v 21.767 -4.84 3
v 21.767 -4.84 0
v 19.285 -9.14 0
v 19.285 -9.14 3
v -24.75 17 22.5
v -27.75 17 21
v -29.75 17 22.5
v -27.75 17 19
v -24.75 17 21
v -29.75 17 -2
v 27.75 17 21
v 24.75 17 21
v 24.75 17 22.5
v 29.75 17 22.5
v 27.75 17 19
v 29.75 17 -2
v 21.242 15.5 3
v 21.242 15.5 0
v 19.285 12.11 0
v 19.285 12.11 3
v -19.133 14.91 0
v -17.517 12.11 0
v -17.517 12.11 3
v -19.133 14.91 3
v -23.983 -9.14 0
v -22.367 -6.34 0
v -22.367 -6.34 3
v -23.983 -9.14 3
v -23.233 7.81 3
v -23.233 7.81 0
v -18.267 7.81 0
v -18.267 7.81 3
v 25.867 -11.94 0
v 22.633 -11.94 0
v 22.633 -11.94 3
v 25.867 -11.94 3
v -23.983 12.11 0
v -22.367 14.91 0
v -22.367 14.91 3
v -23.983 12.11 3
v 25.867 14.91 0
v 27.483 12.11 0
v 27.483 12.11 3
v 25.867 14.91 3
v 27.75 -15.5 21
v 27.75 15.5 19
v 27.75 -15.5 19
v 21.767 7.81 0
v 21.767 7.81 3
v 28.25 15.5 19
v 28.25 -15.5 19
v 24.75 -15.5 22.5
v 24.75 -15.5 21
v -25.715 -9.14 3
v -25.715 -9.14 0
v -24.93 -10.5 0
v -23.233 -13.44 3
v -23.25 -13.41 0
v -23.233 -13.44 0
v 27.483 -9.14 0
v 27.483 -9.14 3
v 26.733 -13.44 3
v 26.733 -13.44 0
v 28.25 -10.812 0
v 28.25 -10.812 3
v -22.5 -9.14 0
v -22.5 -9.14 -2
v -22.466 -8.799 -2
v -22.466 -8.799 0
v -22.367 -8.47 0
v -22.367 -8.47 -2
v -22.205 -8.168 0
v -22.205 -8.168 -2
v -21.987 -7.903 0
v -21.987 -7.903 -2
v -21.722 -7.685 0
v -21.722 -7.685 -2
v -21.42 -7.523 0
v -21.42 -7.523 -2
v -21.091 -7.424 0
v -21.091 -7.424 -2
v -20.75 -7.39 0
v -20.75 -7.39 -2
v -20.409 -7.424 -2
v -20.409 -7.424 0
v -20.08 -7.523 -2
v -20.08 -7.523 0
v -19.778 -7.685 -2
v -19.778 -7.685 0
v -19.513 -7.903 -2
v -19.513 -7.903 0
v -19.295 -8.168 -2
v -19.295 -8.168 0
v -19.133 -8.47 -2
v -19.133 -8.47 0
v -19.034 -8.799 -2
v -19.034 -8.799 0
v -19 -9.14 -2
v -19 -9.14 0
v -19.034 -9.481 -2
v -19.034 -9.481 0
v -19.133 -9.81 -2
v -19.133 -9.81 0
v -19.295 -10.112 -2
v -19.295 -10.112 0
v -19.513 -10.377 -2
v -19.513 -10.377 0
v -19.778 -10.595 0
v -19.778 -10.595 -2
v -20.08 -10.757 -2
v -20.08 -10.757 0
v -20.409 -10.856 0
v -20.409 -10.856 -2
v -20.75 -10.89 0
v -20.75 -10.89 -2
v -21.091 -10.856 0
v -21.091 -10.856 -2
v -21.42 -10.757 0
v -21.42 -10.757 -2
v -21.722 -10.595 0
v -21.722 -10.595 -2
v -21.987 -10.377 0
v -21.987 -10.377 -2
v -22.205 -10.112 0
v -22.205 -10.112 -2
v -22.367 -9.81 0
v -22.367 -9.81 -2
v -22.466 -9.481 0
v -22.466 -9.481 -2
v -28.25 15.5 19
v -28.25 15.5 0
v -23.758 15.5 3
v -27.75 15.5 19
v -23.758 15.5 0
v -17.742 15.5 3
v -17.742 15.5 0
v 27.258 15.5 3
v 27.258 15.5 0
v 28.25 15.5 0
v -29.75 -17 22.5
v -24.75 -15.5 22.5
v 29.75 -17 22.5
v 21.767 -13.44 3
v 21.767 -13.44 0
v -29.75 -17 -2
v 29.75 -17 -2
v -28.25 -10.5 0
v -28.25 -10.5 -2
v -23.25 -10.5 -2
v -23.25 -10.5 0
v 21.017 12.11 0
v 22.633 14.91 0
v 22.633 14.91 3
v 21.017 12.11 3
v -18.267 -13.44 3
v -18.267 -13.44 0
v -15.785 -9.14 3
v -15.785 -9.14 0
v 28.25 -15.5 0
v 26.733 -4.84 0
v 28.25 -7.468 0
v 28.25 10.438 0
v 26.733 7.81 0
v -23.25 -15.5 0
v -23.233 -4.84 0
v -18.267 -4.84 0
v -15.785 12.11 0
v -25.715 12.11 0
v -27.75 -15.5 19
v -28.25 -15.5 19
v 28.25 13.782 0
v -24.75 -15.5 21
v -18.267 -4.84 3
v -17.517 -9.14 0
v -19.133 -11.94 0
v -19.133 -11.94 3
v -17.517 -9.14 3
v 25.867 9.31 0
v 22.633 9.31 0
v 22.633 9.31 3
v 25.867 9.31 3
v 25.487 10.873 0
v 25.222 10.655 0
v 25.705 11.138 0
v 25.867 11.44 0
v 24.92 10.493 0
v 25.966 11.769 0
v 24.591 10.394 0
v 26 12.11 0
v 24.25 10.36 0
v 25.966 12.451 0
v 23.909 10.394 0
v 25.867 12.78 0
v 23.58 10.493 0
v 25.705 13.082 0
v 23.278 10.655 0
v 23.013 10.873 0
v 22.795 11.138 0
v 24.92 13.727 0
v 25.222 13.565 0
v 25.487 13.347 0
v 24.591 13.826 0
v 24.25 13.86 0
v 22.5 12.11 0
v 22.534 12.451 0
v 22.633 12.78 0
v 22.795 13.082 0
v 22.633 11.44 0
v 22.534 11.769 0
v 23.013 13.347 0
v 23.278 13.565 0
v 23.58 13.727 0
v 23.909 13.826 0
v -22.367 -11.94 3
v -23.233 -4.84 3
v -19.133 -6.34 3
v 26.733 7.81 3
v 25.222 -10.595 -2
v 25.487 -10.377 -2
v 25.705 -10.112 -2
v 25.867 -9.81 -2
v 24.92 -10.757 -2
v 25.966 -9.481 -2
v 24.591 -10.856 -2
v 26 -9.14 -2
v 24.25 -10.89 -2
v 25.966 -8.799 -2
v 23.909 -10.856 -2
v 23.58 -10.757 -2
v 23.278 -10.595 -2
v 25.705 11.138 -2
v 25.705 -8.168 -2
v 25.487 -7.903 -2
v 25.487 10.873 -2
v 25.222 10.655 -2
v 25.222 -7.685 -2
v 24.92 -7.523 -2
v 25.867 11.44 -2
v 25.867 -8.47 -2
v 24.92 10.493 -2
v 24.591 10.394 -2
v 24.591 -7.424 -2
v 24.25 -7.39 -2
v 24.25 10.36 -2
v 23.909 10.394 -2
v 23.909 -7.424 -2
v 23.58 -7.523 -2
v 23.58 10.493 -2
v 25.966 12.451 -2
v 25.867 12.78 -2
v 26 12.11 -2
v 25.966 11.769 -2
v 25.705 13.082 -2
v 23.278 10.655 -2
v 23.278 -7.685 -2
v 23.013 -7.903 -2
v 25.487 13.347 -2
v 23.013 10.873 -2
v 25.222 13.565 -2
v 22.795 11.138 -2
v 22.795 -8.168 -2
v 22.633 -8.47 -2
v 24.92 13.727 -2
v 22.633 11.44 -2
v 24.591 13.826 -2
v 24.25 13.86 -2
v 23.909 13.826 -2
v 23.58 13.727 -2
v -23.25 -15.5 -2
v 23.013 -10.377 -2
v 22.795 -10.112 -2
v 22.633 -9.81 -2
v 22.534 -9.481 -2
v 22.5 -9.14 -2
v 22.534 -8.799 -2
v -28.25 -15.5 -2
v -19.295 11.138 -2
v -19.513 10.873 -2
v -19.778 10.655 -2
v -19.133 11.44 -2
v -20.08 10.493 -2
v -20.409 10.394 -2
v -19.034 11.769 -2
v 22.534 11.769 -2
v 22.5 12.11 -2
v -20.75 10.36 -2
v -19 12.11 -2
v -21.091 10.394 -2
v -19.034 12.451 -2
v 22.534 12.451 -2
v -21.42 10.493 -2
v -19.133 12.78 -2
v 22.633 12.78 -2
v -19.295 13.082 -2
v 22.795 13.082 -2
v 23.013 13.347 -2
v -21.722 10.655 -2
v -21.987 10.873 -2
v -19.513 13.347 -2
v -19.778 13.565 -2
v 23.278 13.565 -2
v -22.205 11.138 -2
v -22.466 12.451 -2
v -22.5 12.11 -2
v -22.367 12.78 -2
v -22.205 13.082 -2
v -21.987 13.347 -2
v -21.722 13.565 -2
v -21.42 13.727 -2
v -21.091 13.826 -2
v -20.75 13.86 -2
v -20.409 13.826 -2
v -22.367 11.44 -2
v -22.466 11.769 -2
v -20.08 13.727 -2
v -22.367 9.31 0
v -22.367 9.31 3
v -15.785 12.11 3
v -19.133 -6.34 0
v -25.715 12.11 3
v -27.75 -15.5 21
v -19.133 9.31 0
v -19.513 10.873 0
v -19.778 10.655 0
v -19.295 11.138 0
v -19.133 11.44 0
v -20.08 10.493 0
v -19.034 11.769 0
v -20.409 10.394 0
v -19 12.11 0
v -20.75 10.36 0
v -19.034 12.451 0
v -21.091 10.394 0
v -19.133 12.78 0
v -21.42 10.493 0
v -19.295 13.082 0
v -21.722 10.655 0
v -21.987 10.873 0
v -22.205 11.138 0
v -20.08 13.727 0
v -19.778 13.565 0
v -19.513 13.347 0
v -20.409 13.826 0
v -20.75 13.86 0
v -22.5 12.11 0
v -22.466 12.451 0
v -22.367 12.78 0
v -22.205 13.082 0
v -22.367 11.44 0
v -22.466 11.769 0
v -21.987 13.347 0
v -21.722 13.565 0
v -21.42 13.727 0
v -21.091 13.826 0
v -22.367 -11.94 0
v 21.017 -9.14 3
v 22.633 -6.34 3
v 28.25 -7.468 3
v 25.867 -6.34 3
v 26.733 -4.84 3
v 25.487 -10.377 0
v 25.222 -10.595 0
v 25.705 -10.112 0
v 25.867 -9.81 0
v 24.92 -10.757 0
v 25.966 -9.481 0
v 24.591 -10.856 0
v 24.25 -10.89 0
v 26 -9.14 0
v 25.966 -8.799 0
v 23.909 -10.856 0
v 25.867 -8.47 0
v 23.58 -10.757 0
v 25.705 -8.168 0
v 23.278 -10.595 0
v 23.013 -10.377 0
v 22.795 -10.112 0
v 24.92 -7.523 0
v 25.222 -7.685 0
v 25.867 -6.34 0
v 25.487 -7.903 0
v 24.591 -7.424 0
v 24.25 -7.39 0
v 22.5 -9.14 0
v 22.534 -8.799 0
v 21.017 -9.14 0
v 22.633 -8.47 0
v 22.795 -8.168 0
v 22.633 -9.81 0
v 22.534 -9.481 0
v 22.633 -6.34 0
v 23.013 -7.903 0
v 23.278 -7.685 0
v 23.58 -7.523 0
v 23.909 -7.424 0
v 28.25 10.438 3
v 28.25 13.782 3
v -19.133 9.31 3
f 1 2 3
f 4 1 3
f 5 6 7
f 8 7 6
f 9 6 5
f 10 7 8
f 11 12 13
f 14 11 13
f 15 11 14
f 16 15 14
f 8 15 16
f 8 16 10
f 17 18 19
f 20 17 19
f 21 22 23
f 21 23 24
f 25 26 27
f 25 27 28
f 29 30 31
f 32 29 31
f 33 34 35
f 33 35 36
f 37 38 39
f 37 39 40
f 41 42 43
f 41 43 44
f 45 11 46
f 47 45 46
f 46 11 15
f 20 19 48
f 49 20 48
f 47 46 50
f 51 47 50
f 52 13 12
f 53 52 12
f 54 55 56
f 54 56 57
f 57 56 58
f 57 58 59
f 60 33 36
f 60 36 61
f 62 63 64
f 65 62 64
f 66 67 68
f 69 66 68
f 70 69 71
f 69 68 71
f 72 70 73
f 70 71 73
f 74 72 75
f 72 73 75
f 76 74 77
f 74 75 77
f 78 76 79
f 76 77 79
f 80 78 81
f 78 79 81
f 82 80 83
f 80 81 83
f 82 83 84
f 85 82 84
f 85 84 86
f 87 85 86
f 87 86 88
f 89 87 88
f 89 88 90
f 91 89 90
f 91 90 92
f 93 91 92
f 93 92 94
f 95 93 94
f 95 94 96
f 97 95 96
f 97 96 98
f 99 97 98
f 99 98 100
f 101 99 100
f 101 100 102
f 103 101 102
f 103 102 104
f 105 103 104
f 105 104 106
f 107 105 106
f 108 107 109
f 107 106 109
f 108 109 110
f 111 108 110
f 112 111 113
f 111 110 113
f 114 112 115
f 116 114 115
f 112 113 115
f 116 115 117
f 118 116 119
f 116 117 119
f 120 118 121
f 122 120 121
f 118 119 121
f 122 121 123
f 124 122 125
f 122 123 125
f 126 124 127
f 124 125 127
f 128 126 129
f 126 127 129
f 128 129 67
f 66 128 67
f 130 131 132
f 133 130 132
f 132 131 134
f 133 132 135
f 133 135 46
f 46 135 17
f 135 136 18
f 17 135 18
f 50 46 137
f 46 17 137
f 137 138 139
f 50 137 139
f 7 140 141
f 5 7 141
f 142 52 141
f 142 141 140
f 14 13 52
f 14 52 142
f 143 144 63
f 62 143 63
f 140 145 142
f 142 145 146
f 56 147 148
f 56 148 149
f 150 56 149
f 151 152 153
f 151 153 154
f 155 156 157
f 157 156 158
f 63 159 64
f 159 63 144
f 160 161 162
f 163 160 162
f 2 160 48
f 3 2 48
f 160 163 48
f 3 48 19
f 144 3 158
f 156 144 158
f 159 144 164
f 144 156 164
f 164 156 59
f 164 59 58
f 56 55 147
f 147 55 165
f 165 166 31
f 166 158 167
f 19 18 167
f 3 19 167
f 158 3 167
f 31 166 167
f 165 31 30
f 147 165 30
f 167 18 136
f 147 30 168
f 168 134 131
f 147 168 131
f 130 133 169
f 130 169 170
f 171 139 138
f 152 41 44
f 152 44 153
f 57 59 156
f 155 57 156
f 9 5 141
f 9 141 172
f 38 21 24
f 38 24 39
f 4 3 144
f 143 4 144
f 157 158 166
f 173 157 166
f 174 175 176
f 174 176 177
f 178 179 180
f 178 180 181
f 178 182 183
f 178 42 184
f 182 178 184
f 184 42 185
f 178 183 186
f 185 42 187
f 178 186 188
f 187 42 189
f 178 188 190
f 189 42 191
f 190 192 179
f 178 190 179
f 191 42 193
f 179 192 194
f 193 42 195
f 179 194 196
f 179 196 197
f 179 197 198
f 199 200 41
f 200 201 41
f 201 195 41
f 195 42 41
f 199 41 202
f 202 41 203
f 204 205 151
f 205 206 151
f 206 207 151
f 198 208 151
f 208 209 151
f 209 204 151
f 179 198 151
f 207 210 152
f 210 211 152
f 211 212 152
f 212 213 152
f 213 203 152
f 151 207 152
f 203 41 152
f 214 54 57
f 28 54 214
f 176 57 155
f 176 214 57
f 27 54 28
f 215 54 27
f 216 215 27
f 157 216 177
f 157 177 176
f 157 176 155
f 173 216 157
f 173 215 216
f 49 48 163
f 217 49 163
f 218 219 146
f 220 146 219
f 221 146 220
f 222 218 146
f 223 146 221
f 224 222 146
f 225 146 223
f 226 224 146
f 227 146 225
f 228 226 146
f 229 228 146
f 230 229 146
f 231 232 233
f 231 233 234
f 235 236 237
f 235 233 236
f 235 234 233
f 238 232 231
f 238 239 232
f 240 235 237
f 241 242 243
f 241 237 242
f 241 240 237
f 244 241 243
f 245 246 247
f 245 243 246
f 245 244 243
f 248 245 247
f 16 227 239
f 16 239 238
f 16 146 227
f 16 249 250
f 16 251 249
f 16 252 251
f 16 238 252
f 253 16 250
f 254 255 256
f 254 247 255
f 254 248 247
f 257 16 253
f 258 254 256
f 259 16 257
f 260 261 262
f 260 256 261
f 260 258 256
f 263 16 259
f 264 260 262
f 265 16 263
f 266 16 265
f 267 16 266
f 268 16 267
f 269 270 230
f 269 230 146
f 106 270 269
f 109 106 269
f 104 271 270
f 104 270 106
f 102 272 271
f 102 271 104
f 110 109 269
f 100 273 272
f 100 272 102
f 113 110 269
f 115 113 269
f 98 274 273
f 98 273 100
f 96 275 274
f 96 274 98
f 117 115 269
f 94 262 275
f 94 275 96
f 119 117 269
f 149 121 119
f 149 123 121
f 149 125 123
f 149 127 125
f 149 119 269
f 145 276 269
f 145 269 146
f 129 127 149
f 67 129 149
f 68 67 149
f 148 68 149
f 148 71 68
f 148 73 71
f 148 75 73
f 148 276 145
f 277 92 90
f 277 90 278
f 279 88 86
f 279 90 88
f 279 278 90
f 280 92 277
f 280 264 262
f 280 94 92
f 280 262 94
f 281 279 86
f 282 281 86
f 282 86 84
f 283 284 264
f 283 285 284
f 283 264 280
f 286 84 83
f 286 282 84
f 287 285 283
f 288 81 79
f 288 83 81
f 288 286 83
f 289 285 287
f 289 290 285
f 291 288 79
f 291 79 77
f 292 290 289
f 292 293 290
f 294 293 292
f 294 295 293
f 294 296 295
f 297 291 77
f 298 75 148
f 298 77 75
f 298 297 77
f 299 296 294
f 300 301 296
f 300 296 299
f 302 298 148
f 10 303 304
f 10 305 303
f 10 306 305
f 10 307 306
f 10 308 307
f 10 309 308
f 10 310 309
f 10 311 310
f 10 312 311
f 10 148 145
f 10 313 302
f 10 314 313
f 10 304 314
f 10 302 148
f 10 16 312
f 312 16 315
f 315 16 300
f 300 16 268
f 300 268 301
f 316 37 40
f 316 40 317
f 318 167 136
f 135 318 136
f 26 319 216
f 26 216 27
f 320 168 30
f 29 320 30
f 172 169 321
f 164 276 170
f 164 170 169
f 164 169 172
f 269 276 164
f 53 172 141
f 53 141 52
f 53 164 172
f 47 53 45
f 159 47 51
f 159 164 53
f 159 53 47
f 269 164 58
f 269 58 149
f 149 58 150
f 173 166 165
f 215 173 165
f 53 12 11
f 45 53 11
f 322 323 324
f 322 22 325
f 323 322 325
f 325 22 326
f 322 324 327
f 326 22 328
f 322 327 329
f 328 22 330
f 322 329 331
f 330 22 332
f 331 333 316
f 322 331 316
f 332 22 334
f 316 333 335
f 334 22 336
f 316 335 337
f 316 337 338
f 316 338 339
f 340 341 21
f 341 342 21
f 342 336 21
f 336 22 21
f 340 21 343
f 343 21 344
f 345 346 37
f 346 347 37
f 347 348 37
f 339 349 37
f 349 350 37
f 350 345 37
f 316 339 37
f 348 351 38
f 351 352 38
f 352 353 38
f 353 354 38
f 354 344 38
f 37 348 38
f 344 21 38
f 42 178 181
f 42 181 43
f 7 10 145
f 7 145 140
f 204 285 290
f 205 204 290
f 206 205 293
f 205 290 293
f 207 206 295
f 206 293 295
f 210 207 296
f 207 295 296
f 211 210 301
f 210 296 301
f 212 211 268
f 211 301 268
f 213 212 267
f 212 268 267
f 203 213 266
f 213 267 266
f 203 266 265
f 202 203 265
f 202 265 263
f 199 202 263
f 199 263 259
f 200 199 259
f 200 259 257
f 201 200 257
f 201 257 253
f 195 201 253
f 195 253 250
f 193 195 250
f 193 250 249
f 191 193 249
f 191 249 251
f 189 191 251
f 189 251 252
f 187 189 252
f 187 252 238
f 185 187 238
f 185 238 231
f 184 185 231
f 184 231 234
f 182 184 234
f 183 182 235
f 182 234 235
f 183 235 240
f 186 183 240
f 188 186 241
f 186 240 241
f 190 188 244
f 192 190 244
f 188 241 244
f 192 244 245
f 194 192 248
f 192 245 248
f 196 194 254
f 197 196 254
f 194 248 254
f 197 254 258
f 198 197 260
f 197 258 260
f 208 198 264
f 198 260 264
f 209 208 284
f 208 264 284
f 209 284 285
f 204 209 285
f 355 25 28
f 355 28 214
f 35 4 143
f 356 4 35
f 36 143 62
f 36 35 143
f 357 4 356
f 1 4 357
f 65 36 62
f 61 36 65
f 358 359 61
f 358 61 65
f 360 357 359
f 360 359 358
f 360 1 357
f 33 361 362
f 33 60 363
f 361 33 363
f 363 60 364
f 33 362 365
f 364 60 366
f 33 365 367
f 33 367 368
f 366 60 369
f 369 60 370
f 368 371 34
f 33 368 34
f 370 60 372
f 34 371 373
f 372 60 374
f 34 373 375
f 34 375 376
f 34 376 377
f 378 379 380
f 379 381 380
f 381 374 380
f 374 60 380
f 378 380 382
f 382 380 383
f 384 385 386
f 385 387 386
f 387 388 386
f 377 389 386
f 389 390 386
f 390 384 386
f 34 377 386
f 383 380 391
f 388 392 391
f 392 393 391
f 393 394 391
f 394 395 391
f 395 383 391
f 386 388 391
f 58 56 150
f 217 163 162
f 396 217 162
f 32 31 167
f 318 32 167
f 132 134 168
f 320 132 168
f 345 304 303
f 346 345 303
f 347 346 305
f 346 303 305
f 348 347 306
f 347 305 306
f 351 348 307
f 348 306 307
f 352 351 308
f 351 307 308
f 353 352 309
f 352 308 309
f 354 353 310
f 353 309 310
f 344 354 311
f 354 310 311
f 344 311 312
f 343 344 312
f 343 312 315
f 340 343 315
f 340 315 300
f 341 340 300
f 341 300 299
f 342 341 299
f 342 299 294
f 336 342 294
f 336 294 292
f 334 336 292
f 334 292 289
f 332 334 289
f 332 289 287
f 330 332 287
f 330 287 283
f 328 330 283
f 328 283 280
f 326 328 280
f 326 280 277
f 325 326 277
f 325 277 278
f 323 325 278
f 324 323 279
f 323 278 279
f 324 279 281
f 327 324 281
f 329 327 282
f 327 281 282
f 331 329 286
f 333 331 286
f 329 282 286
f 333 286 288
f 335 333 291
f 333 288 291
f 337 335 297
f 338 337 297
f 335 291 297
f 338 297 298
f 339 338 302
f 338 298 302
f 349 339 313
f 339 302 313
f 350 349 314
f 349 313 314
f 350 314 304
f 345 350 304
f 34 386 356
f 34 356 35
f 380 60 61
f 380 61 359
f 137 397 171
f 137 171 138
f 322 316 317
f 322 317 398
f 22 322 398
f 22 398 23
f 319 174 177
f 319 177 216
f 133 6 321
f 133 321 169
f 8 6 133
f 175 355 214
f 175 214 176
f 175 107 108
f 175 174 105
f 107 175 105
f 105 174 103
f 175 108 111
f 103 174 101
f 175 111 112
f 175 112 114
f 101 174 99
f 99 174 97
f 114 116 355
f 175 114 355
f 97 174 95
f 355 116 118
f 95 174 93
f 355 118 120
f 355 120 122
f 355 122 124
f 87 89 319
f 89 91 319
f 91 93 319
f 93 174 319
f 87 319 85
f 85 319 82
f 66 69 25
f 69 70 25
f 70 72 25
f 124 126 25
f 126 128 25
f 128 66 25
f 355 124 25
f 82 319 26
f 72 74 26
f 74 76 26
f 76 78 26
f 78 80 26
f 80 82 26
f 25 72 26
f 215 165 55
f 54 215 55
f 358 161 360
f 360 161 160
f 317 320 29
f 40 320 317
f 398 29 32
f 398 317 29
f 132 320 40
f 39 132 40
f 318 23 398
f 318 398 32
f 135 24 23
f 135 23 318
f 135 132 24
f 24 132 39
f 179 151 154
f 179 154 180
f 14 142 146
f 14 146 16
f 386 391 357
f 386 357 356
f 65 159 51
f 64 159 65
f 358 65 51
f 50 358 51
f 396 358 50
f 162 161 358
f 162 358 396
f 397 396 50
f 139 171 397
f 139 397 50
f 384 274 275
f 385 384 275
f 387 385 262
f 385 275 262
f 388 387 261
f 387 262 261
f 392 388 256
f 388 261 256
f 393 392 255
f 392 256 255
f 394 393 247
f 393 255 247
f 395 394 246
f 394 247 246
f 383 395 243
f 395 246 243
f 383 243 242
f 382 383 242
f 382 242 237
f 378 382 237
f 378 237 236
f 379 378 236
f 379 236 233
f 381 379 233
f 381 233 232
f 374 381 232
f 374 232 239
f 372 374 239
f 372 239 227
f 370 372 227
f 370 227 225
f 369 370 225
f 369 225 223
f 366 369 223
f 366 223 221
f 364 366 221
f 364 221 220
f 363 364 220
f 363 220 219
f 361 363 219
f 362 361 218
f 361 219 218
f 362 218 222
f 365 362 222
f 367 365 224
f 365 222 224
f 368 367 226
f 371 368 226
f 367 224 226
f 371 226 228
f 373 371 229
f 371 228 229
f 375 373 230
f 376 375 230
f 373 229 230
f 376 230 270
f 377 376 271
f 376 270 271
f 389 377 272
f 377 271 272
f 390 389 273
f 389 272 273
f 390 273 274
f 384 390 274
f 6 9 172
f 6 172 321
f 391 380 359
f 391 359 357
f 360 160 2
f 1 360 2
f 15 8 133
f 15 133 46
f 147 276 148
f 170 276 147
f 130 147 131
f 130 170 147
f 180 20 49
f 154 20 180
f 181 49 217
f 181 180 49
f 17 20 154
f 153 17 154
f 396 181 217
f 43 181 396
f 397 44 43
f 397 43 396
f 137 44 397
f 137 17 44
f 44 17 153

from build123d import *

# Parameters (mm, degrees)
CROQUIS1_W              = 59.5
CROQUIS1_H              = 34
CROQUIS1_W_2            = 56.5
CROQUIS1_H_2            = 31
EXTRUIR_L_MINA1_DEPTH   = 19
CROQUIS2_W              = 59.5
CROQUIS2_H              = 34
SALIENTE_EXTRUIR1_DEPTH = 2
SALIENTE_EXTRUIR3_DEPTH = 34
CROQUIS5_W              = 59.5
CROQUIS5_H              = 1.5
SALIENTE_EXTRUIR4_DEPTH = 3.5
CROQUIS6_W              = 5
CROQUIS6_H              = 5
CORTAR_EXTRUIR1_DEPTH   = 3.5
CROQUIS7_R              = 1.75
CORTAR_EXTRUIR2_DEPTH   = 3.5
EXTRUIR_L_MINA2_DEPTH   = 3


with BuildPart() as part:
    # Croquis1 → Extruir-Lámina1 (new body)
    with BuildSketch(Plane.XY):
        Rectangle(CROQUIS1_W, CROQUIS1_H)
        Rectangle(CROQUIS1_W_2, CROQUIS1_H_2, mode=Mode.SUBTRACT)
    extrude(amount=EXTRUIR_L_MINA1_DEPTH)

    # Croquis2 → Saliente-Extruir1 (add)
    with BuildSketch(Plane(origin=(0, 0, 0), x_dir=(-1, 0, 0), z_dir=(0, 0, -1))):
        Rectangle(CROQUIS2_W, CROQUIS2_H)
    extrude(amount=SALIENTE_EXTRUIR1_DEPTH)

    # Croquis4 → Saliente-Extruir3 (add)
    with BuildSketch(Plane(origin=(0, 17, 0), x_dir=(1, 0, 0), z_dir=(0, 1, 0))):
        Polygon((-29.75, -19), (-29.75, -22.5), (-24.75, -22.5), (-24.75, -21), (-27.75, -21), (-27.75, -19), align=None)
        Polygon((27.75, -21), (27.75, -19), (29.75, -19), (29.75, -22.5), (24.75, -22.5), (24.75, -21), align=None)
    extrude(amount=-SALIENTE_EXTRUIR3_DEPTH)

    # Croquis5 → Saliente-Extruir4 (add)
    with BuildSketch(Plane.XY.offset(19)):
        with Locations((0, -16.25)):
            Rectangle(CROQUIS5_W, CROQUIS5_H)
    extrude(amount=SALIENTE_EXTRUIR4_DEPTH)

    # Croquis6 → Cortar-Extruir1 (cut)
    with BuildSketch(Plane.XY):
        with Locations((-25.75, -13)):
            Rectangle(CROQUIS6_W, CROQUIS6_H)
    extrude(amount=-CORTAR_EXTRUIR1_DEPTH, mode=Mode.SUBTRACT)

    # Croquis7 → Cortar-Extruir2 (cut)
    with BuildSketch(Plane(origin=(0, 0, -2), x_dir=(-1, 0, 0), z_dir=(0, 0, -1))):
        with Locations((20.75, 12.11)):
            Circle(CROQUIS7_R)
        with Locations((20.75, -9.14)):
            Circle(CROQUIS7_R)
        with Locations((-24.25, -9.14)):
            Circle(CROQUIS7_R)
        with Locations((-24.25, 12.11)):
            Circle(CROQUIS7_R)
    extrude(amount=-CORTAR_EXTRUIR2_DEPTH, mode=Mode.SUBTRACT)

    # Croquis8 → Extruir-Lámina2 (add)
    with BuildSketch(Plane.XY):
        Polygon((-15.784787685, 12.11), (-18.267393842, 16.41), (-23.232606158, 16.41), (-25.715212315, 12.11), (-23.232606158, 7.81), (-18.267393842, 7.81), align=None)
        Polygon((-17.516838493, 12.11), (-19.133419246, 14.91), (-22.366580754, 14.91), (-23.983161507, 12.11), (-22.366580754, 9.31), (-19.133419246, 9.31), align=None, mode=Mode.SUBTRACT)
        Polygon((29.215212315, 12.11), (26.732606158, 16.41), (21.767393842, 16.41), (19.284787685, 12.11), (21.767393842, 7.81), (26.732606158, 7.81), align=None)
        Polygon((27.483161507, 12.11), (25.866580754, 14.91), (22.633419246, 14.91), (21.016838493, 12.11), (22.633419246, 9.31), (25.866580754, 9.31), align=None, mode=Mode.SUBTRACT)
        Polygon((-15.784787685, -9.14), (-18.267393842, -4.84), (-23.232606158, -4.84), (-25.715212315, -9.14), (-23.232606158, -13.44), (-18.267393842, -13.44), align=None)
        Polygon((-17.516838493, -9.14), (-19.133419246, -6.34), (-22.366580754, -6.34), (-23.983161507, -9.14), (-22.366580754, -11.94), (-19.133419246, -11.94), align=None, mode=Mode.SUBTRACT)
        Polygon((29.215212315, -9.14), (26.732606158, -4.84), (21.767393842, -4.84), (19.284787685, -9.14), (21.767393842, -13.44), (26.732606158, -13.44), align=None)
        Polygon((27.483161507, -9.14), (25.866580754, -6.34), (22.633419246, -6.34), (21.016838493, -9.14), (22.633419246, -11.94), (25.866580754, -11.94), align=None, mode=Mode.SUBTRACT)
    extrude(amount=EXTRUIR_L_MINA2_DEPTH)


solid = part.part
